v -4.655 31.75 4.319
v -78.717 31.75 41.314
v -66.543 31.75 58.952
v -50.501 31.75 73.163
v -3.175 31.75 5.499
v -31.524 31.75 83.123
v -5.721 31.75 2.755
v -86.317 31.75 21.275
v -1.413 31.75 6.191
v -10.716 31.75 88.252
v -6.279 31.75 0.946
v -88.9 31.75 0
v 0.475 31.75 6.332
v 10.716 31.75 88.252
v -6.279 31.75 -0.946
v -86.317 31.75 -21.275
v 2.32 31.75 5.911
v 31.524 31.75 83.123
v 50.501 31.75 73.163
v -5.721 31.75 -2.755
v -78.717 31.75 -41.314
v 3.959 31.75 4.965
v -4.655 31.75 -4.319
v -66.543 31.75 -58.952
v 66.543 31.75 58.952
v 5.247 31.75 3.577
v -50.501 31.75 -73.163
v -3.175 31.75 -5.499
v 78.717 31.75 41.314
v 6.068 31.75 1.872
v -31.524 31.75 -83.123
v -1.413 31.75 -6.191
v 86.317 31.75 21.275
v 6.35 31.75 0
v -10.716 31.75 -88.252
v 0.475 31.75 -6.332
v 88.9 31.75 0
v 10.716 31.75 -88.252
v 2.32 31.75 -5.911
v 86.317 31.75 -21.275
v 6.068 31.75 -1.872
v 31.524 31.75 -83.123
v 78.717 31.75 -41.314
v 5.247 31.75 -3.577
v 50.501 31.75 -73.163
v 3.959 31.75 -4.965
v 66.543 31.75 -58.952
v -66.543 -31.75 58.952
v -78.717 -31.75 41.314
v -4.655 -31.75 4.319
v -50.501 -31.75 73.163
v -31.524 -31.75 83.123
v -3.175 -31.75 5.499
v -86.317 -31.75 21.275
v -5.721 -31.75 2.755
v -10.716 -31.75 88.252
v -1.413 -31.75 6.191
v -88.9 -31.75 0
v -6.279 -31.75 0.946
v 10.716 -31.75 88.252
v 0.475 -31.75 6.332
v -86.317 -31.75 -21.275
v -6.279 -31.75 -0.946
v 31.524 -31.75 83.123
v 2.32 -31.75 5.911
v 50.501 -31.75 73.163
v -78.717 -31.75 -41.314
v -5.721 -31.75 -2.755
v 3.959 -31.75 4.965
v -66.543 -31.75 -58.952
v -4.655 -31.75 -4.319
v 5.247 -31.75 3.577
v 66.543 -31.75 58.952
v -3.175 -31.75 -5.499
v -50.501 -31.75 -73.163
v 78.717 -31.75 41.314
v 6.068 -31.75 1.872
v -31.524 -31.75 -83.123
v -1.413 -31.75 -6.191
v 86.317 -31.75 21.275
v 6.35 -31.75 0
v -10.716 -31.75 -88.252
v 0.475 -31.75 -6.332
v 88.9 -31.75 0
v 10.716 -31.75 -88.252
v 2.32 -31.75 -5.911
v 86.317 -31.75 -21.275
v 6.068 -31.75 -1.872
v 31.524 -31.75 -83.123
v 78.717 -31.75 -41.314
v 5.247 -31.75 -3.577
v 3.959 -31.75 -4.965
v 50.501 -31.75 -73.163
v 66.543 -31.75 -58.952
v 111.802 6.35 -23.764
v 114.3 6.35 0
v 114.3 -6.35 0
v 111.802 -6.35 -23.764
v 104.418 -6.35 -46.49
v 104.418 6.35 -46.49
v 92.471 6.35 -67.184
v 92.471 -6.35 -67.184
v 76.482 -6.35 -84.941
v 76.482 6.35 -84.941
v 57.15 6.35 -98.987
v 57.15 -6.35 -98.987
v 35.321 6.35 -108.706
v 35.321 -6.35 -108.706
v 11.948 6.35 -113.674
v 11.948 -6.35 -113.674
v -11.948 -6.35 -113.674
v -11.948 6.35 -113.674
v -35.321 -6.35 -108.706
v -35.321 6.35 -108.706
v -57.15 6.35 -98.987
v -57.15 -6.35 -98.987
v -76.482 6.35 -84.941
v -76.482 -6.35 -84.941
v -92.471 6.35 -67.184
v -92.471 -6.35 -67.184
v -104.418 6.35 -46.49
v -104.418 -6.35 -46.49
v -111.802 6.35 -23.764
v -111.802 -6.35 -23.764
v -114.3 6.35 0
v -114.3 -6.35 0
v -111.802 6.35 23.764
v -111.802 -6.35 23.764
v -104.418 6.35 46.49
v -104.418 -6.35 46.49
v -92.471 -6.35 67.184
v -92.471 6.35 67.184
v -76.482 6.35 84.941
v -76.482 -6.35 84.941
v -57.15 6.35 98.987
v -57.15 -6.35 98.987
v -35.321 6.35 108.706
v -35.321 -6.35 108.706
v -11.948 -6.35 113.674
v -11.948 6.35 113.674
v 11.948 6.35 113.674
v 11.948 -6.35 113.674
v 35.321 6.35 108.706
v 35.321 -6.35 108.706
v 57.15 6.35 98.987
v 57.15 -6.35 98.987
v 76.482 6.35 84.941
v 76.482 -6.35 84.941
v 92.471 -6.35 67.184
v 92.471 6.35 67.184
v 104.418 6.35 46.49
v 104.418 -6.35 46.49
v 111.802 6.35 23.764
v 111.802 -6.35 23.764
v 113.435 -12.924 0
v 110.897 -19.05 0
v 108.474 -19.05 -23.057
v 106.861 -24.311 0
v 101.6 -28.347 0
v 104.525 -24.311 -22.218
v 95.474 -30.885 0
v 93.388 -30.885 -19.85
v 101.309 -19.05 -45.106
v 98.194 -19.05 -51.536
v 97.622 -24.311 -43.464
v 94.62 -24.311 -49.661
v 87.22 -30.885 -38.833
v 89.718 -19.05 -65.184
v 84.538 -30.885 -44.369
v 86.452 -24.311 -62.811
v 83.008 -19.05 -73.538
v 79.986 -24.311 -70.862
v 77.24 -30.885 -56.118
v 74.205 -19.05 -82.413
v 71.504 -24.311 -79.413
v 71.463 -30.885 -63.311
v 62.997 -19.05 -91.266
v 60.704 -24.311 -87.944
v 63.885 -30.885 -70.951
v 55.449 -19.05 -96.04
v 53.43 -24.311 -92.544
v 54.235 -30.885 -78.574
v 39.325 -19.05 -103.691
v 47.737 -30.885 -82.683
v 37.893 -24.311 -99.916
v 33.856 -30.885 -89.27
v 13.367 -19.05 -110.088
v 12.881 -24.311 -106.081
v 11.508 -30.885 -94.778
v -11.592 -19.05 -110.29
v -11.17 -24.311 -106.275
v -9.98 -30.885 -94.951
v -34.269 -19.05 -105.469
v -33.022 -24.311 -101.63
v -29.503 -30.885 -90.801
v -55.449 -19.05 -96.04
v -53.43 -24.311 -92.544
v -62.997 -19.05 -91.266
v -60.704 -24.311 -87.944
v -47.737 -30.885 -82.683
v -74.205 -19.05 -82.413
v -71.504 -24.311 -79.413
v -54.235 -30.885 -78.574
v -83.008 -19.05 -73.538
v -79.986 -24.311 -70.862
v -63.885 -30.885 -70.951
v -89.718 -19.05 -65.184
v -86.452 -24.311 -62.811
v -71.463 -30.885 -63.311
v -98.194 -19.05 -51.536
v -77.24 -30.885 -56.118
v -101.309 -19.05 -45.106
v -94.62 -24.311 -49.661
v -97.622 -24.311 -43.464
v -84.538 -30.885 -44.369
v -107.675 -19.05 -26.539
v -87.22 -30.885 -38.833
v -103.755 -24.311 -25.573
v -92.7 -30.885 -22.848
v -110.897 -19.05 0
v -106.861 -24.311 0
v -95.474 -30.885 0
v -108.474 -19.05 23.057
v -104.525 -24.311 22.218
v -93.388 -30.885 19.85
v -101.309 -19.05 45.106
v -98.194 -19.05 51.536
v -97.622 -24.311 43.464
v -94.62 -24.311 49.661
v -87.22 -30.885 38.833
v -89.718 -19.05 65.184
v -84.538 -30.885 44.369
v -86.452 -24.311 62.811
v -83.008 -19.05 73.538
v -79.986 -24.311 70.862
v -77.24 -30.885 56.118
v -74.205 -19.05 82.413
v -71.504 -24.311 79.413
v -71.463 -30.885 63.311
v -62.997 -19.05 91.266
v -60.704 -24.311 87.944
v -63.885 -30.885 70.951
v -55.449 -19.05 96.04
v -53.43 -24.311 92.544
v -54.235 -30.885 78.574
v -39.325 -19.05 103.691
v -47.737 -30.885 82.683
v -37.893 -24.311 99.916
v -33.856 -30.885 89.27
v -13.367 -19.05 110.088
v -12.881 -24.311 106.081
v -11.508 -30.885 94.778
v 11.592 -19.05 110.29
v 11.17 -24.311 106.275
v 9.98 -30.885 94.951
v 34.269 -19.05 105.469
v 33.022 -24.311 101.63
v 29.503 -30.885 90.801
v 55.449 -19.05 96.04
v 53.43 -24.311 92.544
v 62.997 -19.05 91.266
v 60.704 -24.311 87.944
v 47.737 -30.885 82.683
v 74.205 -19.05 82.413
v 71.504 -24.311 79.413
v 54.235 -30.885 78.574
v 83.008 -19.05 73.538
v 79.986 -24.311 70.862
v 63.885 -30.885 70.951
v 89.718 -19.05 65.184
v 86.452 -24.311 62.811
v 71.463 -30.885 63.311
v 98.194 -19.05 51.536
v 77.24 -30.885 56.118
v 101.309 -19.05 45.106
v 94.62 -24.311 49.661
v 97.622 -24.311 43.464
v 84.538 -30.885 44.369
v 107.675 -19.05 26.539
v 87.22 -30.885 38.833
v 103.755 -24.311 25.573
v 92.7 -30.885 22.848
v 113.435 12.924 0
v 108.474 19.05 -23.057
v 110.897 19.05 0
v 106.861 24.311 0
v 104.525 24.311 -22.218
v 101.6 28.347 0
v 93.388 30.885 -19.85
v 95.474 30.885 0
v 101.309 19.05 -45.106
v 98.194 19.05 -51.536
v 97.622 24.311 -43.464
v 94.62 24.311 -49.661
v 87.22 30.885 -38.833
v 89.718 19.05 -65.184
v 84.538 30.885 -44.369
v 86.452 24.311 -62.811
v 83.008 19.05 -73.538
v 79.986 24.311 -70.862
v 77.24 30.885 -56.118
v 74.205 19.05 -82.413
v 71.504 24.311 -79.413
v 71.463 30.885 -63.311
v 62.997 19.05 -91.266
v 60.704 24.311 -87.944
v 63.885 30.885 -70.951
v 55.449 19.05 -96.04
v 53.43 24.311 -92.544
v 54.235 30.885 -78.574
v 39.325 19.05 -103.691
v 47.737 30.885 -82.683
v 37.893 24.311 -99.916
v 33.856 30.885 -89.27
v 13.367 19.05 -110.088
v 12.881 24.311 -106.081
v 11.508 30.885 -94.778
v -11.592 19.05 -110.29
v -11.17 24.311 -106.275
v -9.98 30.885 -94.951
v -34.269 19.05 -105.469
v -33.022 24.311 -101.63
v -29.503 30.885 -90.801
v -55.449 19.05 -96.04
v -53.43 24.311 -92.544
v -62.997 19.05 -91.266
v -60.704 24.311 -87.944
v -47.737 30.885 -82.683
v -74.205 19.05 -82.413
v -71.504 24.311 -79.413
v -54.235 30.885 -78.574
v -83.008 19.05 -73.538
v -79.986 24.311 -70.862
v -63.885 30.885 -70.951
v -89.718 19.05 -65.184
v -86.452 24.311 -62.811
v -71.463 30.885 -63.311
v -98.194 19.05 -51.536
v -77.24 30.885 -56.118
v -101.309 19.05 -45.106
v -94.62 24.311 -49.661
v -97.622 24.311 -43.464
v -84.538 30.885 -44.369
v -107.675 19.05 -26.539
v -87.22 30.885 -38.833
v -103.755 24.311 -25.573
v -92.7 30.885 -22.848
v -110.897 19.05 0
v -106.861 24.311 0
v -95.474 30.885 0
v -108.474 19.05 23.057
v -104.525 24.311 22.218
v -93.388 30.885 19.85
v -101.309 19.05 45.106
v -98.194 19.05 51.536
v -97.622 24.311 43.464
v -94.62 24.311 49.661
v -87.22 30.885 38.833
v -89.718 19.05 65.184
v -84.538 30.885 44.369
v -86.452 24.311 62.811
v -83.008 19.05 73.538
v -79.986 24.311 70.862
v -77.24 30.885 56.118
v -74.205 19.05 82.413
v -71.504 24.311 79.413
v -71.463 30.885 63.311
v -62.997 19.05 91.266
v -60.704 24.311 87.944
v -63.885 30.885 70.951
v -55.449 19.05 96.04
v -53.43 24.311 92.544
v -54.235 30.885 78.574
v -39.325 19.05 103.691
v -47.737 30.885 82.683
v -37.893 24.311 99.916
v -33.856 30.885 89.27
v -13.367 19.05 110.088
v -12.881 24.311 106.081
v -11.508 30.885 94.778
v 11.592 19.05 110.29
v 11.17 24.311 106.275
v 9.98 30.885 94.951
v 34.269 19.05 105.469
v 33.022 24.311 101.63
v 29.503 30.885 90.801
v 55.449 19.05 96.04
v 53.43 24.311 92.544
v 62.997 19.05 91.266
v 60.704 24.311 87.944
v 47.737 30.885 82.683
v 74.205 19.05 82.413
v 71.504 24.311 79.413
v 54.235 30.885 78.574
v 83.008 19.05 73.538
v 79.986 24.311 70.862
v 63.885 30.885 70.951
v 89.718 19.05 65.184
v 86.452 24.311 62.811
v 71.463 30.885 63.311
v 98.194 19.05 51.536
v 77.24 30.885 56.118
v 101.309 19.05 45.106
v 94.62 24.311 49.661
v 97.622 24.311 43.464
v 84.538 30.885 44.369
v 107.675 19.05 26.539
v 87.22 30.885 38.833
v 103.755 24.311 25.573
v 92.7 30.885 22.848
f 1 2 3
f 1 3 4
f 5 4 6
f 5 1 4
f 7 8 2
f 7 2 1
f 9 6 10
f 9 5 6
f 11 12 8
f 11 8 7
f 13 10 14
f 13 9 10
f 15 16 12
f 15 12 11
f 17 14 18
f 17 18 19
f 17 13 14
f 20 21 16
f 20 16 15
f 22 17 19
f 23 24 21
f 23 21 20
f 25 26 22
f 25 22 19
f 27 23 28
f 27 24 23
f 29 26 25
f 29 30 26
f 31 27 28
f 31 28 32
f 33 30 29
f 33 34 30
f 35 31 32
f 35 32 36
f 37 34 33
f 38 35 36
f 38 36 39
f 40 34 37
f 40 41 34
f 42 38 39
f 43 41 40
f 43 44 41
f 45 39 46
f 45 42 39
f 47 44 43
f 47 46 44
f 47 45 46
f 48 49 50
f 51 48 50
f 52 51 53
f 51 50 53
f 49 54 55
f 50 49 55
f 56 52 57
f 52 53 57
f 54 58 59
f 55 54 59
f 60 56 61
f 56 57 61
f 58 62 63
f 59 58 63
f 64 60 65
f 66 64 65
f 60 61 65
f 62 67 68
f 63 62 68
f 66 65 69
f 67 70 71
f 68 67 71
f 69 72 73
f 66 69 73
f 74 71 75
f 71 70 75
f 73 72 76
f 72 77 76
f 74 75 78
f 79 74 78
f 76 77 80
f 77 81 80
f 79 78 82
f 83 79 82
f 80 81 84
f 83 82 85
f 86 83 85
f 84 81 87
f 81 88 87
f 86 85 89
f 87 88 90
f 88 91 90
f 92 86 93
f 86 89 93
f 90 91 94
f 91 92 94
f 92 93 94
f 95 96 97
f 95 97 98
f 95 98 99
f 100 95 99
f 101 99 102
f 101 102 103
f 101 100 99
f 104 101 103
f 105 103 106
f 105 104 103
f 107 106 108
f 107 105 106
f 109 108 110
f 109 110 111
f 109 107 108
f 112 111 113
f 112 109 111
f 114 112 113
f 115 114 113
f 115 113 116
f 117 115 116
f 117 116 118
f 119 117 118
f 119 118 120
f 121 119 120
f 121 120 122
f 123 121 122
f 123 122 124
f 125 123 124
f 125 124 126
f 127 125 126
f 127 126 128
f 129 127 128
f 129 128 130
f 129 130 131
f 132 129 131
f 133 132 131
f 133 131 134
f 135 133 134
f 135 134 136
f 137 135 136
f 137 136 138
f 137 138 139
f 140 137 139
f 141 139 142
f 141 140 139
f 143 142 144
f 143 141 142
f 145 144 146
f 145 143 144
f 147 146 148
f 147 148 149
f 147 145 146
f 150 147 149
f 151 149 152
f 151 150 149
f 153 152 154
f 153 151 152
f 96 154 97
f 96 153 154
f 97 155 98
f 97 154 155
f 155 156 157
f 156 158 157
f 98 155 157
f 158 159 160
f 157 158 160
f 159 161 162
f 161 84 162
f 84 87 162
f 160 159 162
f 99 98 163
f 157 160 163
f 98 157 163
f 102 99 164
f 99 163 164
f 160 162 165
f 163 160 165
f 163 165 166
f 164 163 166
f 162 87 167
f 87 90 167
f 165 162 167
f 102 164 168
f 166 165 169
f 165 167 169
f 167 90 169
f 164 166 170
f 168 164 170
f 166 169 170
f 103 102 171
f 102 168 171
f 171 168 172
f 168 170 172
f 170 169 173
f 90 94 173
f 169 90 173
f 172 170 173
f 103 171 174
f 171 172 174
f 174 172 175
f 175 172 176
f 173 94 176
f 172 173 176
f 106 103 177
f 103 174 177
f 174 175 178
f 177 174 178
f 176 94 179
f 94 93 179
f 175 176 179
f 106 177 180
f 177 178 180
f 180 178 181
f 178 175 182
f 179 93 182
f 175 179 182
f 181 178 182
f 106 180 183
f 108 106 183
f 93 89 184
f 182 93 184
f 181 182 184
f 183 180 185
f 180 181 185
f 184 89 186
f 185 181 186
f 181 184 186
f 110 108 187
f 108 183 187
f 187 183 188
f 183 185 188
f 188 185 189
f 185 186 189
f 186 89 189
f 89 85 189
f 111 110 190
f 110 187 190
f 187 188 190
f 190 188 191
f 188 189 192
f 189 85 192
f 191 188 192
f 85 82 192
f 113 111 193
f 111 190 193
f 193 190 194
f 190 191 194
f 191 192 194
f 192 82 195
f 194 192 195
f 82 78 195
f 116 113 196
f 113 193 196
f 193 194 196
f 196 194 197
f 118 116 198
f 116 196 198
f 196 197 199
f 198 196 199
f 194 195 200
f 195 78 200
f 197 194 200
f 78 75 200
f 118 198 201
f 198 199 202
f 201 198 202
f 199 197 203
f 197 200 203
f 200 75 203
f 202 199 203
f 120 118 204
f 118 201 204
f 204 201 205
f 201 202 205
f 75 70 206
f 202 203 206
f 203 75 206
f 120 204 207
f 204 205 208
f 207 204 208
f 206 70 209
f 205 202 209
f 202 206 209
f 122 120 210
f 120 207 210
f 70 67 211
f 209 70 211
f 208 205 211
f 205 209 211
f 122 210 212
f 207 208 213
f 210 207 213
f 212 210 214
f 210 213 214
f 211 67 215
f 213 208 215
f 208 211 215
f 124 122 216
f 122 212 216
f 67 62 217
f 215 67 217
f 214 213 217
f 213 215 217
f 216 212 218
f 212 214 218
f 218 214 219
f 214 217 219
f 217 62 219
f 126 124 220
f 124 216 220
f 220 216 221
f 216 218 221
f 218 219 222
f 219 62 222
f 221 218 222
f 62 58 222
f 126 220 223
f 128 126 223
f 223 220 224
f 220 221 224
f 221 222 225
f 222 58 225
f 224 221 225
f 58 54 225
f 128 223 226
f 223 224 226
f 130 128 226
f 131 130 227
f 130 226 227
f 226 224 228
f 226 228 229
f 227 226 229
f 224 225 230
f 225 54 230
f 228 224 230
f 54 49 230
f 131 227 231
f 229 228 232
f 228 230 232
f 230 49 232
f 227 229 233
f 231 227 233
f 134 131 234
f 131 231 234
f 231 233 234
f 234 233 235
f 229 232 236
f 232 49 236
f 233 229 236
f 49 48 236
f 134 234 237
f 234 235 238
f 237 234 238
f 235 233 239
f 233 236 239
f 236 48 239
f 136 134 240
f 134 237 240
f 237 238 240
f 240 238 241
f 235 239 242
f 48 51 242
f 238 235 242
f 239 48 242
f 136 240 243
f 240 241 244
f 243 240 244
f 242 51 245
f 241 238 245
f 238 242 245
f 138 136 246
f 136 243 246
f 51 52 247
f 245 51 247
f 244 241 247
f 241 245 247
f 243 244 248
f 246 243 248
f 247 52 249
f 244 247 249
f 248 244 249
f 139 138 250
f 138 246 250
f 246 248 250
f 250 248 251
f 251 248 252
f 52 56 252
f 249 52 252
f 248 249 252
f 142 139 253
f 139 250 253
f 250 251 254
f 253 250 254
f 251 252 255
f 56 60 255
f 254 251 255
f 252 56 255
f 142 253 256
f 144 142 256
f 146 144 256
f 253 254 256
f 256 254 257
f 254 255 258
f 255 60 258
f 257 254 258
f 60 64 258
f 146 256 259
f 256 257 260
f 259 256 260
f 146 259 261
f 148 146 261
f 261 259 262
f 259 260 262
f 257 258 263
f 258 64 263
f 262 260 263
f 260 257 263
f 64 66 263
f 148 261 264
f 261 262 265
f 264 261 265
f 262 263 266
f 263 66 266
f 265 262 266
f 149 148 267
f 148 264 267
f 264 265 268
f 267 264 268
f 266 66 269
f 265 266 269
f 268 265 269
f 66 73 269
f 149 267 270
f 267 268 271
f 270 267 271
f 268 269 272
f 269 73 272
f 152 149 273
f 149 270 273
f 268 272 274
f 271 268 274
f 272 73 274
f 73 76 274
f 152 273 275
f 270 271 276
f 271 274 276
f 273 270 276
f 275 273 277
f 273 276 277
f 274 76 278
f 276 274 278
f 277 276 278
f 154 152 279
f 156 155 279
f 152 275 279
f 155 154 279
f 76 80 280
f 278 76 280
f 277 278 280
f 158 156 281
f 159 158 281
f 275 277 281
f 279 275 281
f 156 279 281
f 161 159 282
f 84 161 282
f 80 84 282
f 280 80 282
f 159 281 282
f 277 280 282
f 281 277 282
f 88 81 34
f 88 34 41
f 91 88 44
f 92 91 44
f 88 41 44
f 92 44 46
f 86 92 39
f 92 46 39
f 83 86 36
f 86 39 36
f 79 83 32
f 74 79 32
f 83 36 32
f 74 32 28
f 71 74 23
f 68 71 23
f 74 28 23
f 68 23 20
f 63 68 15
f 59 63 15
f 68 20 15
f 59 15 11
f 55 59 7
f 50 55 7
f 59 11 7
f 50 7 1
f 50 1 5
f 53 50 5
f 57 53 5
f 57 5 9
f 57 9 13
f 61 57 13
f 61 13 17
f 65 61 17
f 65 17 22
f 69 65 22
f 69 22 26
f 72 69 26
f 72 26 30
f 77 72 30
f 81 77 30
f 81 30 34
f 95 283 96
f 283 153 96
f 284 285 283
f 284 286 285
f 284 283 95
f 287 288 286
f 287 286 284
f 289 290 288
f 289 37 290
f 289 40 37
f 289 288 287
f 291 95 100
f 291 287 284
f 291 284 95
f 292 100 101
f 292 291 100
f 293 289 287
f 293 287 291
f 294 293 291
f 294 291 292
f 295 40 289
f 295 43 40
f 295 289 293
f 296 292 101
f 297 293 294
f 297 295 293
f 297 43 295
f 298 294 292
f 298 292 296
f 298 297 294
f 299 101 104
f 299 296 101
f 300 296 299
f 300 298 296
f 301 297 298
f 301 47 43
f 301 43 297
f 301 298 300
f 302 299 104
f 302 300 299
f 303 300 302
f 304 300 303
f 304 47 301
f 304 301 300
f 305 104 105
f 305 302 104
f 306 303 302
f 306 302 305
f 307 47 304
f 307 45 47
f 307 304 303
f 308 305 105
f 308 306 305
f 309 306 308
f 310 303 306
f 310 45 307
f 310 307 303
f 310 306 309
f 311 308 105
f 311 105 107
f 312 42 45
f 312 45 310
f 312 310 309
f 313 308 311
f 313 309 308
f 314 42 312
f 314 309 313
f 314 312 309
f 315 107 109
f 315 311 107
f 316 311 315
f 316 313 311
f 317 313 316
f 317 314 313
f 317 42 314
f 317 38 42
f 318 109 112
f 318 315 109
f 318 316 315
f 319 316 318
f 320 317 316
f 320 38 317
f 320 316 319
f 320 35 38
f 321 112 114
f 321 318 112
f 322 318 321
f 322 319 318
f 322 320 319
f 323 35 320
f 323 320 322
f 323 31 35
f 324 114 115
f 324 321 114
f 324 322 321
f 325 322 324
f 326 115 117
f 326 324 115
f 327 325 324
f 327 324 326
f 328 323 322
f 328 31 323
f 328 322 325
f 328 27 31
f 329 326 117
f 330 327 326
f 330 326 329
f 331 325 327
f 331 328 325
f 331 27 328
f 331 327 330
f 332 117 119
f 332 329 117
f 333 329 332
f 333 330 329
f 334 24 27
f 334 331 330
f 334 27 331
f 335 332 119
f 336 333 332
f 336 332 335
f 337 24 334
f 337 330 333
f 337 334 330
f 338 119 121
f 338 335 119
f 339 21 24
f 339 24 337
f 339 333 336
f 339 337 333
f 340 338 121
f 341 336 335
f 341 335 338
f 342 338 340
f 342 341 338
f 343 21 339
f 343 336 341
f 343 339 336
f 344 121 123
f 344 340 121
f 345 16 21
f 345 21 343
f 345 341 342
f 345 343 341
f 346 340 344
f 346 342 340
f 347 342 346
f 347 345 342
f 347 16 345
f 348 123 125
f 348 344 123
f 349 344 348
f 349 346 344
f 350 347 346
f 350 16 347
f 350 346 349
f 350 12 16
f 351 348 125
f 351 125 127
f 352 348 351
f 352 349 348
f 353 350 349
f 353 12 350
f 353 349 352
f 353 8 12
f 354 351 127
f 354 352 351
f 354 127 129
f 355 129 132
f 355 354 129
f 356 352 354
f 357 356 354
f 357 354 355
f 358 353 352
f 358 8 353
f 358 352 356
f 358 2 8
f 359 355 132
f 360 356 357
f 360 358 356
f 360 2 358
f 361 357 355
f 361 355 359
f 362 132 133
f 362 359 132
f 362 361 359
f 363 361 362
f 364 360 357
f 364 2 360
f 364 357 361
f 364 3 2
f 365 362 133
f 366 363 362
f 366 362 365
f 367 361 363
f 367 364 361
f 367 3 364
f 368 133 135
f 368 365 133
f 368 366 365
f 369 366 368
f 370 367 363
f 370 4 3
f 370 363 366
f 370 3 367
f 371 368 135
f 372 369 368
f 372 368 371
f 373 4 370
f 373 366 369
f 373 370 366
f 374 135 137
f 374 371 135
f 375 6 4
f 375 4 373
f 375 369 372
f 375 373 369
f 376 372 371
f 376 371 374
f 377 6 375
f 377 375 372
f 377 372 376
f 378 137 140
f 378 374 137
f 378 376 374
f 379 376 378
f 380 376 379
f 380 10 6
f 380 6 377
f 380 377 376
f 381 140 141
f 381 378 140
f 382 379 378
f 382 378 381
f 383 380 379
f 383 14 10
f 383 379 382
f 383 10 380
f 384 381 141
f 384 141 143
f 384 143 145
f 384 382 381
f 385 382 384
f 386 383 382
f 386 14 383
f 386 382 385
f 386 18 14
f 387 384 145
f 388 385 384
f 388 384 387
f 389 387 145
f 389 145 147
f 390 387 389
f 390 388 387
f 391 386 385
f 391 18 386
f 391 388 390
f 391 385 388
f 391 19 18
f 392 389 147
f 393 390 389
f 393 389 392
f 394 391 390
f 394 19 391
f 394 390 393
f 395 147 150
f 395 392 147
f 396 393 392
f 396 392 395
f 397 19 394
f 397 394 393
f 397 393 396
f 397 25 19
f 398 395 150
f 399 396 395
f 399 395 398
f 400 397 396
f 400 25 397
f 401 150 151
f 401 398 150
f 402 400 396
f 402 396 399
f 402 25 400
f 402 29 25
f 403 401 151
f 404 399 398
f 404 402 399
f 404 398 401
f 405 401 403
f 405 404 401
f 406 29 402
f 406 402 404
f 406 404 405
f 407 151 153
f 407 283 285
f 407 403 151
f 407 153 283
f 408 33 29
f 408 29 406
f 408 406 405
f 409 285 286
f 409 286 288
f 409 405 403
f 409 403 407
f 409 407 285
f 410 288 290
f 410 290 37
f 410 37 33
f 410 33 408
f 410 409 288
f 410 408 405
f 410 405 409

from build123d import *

# Parameters (mm, degrees)
BOSS_EXTRUDE1_DEPTH      = 31.75
BOSS_EXTRUDE1_DEPTH_BACK = 31.75
SKETCH1_R                = 114.3
FILLET1_R                = 25.4
SKETCH2_R                = 6.35
CUT_EXTRUDE1_DEPTH       = 107.188


with BuildPart() as part:
    # Sketch1 → Boss-Extrude1 (new, two sides: drawn at the far end of the back side and taken through both)
    with BuildSketch(Plane(origin=(0, 0, 0), x_dir=(1, 0, 0), z_dir=(0, 1, 0)).offset(-BOSS_EXTRUDE1_DEPTH_BACK)):
        Circle(SKETCH1_R)
    extrude(amount=BOSS_EXTRUDE1_DEPTH + BOSS_EXTRUDE1_DEPTH_BACK)

    # Fillet1
    fillet1_edges = [part.edges().sort_by_distance(p)[0] for p in [
        (-114.3, -31.75, 0),
        (-114.3, 31.75, 0),
    ]]
    fillet(fillet1_edges, radius=FILLET1_R)

    # Sketch2 → Cut-Extrude1 (cut)
    with BuildSketch(Plane(origin=(0, 31.75, 0), x_dir=(1, 0, 0), z_dir=(0, 1, 0))):
        Circle(SKETCH2_R)
    extrude(amount=-CUT_EXTRUDE1_DEPTH, mode=Mode.SUBTRACT)


solid = part.part
